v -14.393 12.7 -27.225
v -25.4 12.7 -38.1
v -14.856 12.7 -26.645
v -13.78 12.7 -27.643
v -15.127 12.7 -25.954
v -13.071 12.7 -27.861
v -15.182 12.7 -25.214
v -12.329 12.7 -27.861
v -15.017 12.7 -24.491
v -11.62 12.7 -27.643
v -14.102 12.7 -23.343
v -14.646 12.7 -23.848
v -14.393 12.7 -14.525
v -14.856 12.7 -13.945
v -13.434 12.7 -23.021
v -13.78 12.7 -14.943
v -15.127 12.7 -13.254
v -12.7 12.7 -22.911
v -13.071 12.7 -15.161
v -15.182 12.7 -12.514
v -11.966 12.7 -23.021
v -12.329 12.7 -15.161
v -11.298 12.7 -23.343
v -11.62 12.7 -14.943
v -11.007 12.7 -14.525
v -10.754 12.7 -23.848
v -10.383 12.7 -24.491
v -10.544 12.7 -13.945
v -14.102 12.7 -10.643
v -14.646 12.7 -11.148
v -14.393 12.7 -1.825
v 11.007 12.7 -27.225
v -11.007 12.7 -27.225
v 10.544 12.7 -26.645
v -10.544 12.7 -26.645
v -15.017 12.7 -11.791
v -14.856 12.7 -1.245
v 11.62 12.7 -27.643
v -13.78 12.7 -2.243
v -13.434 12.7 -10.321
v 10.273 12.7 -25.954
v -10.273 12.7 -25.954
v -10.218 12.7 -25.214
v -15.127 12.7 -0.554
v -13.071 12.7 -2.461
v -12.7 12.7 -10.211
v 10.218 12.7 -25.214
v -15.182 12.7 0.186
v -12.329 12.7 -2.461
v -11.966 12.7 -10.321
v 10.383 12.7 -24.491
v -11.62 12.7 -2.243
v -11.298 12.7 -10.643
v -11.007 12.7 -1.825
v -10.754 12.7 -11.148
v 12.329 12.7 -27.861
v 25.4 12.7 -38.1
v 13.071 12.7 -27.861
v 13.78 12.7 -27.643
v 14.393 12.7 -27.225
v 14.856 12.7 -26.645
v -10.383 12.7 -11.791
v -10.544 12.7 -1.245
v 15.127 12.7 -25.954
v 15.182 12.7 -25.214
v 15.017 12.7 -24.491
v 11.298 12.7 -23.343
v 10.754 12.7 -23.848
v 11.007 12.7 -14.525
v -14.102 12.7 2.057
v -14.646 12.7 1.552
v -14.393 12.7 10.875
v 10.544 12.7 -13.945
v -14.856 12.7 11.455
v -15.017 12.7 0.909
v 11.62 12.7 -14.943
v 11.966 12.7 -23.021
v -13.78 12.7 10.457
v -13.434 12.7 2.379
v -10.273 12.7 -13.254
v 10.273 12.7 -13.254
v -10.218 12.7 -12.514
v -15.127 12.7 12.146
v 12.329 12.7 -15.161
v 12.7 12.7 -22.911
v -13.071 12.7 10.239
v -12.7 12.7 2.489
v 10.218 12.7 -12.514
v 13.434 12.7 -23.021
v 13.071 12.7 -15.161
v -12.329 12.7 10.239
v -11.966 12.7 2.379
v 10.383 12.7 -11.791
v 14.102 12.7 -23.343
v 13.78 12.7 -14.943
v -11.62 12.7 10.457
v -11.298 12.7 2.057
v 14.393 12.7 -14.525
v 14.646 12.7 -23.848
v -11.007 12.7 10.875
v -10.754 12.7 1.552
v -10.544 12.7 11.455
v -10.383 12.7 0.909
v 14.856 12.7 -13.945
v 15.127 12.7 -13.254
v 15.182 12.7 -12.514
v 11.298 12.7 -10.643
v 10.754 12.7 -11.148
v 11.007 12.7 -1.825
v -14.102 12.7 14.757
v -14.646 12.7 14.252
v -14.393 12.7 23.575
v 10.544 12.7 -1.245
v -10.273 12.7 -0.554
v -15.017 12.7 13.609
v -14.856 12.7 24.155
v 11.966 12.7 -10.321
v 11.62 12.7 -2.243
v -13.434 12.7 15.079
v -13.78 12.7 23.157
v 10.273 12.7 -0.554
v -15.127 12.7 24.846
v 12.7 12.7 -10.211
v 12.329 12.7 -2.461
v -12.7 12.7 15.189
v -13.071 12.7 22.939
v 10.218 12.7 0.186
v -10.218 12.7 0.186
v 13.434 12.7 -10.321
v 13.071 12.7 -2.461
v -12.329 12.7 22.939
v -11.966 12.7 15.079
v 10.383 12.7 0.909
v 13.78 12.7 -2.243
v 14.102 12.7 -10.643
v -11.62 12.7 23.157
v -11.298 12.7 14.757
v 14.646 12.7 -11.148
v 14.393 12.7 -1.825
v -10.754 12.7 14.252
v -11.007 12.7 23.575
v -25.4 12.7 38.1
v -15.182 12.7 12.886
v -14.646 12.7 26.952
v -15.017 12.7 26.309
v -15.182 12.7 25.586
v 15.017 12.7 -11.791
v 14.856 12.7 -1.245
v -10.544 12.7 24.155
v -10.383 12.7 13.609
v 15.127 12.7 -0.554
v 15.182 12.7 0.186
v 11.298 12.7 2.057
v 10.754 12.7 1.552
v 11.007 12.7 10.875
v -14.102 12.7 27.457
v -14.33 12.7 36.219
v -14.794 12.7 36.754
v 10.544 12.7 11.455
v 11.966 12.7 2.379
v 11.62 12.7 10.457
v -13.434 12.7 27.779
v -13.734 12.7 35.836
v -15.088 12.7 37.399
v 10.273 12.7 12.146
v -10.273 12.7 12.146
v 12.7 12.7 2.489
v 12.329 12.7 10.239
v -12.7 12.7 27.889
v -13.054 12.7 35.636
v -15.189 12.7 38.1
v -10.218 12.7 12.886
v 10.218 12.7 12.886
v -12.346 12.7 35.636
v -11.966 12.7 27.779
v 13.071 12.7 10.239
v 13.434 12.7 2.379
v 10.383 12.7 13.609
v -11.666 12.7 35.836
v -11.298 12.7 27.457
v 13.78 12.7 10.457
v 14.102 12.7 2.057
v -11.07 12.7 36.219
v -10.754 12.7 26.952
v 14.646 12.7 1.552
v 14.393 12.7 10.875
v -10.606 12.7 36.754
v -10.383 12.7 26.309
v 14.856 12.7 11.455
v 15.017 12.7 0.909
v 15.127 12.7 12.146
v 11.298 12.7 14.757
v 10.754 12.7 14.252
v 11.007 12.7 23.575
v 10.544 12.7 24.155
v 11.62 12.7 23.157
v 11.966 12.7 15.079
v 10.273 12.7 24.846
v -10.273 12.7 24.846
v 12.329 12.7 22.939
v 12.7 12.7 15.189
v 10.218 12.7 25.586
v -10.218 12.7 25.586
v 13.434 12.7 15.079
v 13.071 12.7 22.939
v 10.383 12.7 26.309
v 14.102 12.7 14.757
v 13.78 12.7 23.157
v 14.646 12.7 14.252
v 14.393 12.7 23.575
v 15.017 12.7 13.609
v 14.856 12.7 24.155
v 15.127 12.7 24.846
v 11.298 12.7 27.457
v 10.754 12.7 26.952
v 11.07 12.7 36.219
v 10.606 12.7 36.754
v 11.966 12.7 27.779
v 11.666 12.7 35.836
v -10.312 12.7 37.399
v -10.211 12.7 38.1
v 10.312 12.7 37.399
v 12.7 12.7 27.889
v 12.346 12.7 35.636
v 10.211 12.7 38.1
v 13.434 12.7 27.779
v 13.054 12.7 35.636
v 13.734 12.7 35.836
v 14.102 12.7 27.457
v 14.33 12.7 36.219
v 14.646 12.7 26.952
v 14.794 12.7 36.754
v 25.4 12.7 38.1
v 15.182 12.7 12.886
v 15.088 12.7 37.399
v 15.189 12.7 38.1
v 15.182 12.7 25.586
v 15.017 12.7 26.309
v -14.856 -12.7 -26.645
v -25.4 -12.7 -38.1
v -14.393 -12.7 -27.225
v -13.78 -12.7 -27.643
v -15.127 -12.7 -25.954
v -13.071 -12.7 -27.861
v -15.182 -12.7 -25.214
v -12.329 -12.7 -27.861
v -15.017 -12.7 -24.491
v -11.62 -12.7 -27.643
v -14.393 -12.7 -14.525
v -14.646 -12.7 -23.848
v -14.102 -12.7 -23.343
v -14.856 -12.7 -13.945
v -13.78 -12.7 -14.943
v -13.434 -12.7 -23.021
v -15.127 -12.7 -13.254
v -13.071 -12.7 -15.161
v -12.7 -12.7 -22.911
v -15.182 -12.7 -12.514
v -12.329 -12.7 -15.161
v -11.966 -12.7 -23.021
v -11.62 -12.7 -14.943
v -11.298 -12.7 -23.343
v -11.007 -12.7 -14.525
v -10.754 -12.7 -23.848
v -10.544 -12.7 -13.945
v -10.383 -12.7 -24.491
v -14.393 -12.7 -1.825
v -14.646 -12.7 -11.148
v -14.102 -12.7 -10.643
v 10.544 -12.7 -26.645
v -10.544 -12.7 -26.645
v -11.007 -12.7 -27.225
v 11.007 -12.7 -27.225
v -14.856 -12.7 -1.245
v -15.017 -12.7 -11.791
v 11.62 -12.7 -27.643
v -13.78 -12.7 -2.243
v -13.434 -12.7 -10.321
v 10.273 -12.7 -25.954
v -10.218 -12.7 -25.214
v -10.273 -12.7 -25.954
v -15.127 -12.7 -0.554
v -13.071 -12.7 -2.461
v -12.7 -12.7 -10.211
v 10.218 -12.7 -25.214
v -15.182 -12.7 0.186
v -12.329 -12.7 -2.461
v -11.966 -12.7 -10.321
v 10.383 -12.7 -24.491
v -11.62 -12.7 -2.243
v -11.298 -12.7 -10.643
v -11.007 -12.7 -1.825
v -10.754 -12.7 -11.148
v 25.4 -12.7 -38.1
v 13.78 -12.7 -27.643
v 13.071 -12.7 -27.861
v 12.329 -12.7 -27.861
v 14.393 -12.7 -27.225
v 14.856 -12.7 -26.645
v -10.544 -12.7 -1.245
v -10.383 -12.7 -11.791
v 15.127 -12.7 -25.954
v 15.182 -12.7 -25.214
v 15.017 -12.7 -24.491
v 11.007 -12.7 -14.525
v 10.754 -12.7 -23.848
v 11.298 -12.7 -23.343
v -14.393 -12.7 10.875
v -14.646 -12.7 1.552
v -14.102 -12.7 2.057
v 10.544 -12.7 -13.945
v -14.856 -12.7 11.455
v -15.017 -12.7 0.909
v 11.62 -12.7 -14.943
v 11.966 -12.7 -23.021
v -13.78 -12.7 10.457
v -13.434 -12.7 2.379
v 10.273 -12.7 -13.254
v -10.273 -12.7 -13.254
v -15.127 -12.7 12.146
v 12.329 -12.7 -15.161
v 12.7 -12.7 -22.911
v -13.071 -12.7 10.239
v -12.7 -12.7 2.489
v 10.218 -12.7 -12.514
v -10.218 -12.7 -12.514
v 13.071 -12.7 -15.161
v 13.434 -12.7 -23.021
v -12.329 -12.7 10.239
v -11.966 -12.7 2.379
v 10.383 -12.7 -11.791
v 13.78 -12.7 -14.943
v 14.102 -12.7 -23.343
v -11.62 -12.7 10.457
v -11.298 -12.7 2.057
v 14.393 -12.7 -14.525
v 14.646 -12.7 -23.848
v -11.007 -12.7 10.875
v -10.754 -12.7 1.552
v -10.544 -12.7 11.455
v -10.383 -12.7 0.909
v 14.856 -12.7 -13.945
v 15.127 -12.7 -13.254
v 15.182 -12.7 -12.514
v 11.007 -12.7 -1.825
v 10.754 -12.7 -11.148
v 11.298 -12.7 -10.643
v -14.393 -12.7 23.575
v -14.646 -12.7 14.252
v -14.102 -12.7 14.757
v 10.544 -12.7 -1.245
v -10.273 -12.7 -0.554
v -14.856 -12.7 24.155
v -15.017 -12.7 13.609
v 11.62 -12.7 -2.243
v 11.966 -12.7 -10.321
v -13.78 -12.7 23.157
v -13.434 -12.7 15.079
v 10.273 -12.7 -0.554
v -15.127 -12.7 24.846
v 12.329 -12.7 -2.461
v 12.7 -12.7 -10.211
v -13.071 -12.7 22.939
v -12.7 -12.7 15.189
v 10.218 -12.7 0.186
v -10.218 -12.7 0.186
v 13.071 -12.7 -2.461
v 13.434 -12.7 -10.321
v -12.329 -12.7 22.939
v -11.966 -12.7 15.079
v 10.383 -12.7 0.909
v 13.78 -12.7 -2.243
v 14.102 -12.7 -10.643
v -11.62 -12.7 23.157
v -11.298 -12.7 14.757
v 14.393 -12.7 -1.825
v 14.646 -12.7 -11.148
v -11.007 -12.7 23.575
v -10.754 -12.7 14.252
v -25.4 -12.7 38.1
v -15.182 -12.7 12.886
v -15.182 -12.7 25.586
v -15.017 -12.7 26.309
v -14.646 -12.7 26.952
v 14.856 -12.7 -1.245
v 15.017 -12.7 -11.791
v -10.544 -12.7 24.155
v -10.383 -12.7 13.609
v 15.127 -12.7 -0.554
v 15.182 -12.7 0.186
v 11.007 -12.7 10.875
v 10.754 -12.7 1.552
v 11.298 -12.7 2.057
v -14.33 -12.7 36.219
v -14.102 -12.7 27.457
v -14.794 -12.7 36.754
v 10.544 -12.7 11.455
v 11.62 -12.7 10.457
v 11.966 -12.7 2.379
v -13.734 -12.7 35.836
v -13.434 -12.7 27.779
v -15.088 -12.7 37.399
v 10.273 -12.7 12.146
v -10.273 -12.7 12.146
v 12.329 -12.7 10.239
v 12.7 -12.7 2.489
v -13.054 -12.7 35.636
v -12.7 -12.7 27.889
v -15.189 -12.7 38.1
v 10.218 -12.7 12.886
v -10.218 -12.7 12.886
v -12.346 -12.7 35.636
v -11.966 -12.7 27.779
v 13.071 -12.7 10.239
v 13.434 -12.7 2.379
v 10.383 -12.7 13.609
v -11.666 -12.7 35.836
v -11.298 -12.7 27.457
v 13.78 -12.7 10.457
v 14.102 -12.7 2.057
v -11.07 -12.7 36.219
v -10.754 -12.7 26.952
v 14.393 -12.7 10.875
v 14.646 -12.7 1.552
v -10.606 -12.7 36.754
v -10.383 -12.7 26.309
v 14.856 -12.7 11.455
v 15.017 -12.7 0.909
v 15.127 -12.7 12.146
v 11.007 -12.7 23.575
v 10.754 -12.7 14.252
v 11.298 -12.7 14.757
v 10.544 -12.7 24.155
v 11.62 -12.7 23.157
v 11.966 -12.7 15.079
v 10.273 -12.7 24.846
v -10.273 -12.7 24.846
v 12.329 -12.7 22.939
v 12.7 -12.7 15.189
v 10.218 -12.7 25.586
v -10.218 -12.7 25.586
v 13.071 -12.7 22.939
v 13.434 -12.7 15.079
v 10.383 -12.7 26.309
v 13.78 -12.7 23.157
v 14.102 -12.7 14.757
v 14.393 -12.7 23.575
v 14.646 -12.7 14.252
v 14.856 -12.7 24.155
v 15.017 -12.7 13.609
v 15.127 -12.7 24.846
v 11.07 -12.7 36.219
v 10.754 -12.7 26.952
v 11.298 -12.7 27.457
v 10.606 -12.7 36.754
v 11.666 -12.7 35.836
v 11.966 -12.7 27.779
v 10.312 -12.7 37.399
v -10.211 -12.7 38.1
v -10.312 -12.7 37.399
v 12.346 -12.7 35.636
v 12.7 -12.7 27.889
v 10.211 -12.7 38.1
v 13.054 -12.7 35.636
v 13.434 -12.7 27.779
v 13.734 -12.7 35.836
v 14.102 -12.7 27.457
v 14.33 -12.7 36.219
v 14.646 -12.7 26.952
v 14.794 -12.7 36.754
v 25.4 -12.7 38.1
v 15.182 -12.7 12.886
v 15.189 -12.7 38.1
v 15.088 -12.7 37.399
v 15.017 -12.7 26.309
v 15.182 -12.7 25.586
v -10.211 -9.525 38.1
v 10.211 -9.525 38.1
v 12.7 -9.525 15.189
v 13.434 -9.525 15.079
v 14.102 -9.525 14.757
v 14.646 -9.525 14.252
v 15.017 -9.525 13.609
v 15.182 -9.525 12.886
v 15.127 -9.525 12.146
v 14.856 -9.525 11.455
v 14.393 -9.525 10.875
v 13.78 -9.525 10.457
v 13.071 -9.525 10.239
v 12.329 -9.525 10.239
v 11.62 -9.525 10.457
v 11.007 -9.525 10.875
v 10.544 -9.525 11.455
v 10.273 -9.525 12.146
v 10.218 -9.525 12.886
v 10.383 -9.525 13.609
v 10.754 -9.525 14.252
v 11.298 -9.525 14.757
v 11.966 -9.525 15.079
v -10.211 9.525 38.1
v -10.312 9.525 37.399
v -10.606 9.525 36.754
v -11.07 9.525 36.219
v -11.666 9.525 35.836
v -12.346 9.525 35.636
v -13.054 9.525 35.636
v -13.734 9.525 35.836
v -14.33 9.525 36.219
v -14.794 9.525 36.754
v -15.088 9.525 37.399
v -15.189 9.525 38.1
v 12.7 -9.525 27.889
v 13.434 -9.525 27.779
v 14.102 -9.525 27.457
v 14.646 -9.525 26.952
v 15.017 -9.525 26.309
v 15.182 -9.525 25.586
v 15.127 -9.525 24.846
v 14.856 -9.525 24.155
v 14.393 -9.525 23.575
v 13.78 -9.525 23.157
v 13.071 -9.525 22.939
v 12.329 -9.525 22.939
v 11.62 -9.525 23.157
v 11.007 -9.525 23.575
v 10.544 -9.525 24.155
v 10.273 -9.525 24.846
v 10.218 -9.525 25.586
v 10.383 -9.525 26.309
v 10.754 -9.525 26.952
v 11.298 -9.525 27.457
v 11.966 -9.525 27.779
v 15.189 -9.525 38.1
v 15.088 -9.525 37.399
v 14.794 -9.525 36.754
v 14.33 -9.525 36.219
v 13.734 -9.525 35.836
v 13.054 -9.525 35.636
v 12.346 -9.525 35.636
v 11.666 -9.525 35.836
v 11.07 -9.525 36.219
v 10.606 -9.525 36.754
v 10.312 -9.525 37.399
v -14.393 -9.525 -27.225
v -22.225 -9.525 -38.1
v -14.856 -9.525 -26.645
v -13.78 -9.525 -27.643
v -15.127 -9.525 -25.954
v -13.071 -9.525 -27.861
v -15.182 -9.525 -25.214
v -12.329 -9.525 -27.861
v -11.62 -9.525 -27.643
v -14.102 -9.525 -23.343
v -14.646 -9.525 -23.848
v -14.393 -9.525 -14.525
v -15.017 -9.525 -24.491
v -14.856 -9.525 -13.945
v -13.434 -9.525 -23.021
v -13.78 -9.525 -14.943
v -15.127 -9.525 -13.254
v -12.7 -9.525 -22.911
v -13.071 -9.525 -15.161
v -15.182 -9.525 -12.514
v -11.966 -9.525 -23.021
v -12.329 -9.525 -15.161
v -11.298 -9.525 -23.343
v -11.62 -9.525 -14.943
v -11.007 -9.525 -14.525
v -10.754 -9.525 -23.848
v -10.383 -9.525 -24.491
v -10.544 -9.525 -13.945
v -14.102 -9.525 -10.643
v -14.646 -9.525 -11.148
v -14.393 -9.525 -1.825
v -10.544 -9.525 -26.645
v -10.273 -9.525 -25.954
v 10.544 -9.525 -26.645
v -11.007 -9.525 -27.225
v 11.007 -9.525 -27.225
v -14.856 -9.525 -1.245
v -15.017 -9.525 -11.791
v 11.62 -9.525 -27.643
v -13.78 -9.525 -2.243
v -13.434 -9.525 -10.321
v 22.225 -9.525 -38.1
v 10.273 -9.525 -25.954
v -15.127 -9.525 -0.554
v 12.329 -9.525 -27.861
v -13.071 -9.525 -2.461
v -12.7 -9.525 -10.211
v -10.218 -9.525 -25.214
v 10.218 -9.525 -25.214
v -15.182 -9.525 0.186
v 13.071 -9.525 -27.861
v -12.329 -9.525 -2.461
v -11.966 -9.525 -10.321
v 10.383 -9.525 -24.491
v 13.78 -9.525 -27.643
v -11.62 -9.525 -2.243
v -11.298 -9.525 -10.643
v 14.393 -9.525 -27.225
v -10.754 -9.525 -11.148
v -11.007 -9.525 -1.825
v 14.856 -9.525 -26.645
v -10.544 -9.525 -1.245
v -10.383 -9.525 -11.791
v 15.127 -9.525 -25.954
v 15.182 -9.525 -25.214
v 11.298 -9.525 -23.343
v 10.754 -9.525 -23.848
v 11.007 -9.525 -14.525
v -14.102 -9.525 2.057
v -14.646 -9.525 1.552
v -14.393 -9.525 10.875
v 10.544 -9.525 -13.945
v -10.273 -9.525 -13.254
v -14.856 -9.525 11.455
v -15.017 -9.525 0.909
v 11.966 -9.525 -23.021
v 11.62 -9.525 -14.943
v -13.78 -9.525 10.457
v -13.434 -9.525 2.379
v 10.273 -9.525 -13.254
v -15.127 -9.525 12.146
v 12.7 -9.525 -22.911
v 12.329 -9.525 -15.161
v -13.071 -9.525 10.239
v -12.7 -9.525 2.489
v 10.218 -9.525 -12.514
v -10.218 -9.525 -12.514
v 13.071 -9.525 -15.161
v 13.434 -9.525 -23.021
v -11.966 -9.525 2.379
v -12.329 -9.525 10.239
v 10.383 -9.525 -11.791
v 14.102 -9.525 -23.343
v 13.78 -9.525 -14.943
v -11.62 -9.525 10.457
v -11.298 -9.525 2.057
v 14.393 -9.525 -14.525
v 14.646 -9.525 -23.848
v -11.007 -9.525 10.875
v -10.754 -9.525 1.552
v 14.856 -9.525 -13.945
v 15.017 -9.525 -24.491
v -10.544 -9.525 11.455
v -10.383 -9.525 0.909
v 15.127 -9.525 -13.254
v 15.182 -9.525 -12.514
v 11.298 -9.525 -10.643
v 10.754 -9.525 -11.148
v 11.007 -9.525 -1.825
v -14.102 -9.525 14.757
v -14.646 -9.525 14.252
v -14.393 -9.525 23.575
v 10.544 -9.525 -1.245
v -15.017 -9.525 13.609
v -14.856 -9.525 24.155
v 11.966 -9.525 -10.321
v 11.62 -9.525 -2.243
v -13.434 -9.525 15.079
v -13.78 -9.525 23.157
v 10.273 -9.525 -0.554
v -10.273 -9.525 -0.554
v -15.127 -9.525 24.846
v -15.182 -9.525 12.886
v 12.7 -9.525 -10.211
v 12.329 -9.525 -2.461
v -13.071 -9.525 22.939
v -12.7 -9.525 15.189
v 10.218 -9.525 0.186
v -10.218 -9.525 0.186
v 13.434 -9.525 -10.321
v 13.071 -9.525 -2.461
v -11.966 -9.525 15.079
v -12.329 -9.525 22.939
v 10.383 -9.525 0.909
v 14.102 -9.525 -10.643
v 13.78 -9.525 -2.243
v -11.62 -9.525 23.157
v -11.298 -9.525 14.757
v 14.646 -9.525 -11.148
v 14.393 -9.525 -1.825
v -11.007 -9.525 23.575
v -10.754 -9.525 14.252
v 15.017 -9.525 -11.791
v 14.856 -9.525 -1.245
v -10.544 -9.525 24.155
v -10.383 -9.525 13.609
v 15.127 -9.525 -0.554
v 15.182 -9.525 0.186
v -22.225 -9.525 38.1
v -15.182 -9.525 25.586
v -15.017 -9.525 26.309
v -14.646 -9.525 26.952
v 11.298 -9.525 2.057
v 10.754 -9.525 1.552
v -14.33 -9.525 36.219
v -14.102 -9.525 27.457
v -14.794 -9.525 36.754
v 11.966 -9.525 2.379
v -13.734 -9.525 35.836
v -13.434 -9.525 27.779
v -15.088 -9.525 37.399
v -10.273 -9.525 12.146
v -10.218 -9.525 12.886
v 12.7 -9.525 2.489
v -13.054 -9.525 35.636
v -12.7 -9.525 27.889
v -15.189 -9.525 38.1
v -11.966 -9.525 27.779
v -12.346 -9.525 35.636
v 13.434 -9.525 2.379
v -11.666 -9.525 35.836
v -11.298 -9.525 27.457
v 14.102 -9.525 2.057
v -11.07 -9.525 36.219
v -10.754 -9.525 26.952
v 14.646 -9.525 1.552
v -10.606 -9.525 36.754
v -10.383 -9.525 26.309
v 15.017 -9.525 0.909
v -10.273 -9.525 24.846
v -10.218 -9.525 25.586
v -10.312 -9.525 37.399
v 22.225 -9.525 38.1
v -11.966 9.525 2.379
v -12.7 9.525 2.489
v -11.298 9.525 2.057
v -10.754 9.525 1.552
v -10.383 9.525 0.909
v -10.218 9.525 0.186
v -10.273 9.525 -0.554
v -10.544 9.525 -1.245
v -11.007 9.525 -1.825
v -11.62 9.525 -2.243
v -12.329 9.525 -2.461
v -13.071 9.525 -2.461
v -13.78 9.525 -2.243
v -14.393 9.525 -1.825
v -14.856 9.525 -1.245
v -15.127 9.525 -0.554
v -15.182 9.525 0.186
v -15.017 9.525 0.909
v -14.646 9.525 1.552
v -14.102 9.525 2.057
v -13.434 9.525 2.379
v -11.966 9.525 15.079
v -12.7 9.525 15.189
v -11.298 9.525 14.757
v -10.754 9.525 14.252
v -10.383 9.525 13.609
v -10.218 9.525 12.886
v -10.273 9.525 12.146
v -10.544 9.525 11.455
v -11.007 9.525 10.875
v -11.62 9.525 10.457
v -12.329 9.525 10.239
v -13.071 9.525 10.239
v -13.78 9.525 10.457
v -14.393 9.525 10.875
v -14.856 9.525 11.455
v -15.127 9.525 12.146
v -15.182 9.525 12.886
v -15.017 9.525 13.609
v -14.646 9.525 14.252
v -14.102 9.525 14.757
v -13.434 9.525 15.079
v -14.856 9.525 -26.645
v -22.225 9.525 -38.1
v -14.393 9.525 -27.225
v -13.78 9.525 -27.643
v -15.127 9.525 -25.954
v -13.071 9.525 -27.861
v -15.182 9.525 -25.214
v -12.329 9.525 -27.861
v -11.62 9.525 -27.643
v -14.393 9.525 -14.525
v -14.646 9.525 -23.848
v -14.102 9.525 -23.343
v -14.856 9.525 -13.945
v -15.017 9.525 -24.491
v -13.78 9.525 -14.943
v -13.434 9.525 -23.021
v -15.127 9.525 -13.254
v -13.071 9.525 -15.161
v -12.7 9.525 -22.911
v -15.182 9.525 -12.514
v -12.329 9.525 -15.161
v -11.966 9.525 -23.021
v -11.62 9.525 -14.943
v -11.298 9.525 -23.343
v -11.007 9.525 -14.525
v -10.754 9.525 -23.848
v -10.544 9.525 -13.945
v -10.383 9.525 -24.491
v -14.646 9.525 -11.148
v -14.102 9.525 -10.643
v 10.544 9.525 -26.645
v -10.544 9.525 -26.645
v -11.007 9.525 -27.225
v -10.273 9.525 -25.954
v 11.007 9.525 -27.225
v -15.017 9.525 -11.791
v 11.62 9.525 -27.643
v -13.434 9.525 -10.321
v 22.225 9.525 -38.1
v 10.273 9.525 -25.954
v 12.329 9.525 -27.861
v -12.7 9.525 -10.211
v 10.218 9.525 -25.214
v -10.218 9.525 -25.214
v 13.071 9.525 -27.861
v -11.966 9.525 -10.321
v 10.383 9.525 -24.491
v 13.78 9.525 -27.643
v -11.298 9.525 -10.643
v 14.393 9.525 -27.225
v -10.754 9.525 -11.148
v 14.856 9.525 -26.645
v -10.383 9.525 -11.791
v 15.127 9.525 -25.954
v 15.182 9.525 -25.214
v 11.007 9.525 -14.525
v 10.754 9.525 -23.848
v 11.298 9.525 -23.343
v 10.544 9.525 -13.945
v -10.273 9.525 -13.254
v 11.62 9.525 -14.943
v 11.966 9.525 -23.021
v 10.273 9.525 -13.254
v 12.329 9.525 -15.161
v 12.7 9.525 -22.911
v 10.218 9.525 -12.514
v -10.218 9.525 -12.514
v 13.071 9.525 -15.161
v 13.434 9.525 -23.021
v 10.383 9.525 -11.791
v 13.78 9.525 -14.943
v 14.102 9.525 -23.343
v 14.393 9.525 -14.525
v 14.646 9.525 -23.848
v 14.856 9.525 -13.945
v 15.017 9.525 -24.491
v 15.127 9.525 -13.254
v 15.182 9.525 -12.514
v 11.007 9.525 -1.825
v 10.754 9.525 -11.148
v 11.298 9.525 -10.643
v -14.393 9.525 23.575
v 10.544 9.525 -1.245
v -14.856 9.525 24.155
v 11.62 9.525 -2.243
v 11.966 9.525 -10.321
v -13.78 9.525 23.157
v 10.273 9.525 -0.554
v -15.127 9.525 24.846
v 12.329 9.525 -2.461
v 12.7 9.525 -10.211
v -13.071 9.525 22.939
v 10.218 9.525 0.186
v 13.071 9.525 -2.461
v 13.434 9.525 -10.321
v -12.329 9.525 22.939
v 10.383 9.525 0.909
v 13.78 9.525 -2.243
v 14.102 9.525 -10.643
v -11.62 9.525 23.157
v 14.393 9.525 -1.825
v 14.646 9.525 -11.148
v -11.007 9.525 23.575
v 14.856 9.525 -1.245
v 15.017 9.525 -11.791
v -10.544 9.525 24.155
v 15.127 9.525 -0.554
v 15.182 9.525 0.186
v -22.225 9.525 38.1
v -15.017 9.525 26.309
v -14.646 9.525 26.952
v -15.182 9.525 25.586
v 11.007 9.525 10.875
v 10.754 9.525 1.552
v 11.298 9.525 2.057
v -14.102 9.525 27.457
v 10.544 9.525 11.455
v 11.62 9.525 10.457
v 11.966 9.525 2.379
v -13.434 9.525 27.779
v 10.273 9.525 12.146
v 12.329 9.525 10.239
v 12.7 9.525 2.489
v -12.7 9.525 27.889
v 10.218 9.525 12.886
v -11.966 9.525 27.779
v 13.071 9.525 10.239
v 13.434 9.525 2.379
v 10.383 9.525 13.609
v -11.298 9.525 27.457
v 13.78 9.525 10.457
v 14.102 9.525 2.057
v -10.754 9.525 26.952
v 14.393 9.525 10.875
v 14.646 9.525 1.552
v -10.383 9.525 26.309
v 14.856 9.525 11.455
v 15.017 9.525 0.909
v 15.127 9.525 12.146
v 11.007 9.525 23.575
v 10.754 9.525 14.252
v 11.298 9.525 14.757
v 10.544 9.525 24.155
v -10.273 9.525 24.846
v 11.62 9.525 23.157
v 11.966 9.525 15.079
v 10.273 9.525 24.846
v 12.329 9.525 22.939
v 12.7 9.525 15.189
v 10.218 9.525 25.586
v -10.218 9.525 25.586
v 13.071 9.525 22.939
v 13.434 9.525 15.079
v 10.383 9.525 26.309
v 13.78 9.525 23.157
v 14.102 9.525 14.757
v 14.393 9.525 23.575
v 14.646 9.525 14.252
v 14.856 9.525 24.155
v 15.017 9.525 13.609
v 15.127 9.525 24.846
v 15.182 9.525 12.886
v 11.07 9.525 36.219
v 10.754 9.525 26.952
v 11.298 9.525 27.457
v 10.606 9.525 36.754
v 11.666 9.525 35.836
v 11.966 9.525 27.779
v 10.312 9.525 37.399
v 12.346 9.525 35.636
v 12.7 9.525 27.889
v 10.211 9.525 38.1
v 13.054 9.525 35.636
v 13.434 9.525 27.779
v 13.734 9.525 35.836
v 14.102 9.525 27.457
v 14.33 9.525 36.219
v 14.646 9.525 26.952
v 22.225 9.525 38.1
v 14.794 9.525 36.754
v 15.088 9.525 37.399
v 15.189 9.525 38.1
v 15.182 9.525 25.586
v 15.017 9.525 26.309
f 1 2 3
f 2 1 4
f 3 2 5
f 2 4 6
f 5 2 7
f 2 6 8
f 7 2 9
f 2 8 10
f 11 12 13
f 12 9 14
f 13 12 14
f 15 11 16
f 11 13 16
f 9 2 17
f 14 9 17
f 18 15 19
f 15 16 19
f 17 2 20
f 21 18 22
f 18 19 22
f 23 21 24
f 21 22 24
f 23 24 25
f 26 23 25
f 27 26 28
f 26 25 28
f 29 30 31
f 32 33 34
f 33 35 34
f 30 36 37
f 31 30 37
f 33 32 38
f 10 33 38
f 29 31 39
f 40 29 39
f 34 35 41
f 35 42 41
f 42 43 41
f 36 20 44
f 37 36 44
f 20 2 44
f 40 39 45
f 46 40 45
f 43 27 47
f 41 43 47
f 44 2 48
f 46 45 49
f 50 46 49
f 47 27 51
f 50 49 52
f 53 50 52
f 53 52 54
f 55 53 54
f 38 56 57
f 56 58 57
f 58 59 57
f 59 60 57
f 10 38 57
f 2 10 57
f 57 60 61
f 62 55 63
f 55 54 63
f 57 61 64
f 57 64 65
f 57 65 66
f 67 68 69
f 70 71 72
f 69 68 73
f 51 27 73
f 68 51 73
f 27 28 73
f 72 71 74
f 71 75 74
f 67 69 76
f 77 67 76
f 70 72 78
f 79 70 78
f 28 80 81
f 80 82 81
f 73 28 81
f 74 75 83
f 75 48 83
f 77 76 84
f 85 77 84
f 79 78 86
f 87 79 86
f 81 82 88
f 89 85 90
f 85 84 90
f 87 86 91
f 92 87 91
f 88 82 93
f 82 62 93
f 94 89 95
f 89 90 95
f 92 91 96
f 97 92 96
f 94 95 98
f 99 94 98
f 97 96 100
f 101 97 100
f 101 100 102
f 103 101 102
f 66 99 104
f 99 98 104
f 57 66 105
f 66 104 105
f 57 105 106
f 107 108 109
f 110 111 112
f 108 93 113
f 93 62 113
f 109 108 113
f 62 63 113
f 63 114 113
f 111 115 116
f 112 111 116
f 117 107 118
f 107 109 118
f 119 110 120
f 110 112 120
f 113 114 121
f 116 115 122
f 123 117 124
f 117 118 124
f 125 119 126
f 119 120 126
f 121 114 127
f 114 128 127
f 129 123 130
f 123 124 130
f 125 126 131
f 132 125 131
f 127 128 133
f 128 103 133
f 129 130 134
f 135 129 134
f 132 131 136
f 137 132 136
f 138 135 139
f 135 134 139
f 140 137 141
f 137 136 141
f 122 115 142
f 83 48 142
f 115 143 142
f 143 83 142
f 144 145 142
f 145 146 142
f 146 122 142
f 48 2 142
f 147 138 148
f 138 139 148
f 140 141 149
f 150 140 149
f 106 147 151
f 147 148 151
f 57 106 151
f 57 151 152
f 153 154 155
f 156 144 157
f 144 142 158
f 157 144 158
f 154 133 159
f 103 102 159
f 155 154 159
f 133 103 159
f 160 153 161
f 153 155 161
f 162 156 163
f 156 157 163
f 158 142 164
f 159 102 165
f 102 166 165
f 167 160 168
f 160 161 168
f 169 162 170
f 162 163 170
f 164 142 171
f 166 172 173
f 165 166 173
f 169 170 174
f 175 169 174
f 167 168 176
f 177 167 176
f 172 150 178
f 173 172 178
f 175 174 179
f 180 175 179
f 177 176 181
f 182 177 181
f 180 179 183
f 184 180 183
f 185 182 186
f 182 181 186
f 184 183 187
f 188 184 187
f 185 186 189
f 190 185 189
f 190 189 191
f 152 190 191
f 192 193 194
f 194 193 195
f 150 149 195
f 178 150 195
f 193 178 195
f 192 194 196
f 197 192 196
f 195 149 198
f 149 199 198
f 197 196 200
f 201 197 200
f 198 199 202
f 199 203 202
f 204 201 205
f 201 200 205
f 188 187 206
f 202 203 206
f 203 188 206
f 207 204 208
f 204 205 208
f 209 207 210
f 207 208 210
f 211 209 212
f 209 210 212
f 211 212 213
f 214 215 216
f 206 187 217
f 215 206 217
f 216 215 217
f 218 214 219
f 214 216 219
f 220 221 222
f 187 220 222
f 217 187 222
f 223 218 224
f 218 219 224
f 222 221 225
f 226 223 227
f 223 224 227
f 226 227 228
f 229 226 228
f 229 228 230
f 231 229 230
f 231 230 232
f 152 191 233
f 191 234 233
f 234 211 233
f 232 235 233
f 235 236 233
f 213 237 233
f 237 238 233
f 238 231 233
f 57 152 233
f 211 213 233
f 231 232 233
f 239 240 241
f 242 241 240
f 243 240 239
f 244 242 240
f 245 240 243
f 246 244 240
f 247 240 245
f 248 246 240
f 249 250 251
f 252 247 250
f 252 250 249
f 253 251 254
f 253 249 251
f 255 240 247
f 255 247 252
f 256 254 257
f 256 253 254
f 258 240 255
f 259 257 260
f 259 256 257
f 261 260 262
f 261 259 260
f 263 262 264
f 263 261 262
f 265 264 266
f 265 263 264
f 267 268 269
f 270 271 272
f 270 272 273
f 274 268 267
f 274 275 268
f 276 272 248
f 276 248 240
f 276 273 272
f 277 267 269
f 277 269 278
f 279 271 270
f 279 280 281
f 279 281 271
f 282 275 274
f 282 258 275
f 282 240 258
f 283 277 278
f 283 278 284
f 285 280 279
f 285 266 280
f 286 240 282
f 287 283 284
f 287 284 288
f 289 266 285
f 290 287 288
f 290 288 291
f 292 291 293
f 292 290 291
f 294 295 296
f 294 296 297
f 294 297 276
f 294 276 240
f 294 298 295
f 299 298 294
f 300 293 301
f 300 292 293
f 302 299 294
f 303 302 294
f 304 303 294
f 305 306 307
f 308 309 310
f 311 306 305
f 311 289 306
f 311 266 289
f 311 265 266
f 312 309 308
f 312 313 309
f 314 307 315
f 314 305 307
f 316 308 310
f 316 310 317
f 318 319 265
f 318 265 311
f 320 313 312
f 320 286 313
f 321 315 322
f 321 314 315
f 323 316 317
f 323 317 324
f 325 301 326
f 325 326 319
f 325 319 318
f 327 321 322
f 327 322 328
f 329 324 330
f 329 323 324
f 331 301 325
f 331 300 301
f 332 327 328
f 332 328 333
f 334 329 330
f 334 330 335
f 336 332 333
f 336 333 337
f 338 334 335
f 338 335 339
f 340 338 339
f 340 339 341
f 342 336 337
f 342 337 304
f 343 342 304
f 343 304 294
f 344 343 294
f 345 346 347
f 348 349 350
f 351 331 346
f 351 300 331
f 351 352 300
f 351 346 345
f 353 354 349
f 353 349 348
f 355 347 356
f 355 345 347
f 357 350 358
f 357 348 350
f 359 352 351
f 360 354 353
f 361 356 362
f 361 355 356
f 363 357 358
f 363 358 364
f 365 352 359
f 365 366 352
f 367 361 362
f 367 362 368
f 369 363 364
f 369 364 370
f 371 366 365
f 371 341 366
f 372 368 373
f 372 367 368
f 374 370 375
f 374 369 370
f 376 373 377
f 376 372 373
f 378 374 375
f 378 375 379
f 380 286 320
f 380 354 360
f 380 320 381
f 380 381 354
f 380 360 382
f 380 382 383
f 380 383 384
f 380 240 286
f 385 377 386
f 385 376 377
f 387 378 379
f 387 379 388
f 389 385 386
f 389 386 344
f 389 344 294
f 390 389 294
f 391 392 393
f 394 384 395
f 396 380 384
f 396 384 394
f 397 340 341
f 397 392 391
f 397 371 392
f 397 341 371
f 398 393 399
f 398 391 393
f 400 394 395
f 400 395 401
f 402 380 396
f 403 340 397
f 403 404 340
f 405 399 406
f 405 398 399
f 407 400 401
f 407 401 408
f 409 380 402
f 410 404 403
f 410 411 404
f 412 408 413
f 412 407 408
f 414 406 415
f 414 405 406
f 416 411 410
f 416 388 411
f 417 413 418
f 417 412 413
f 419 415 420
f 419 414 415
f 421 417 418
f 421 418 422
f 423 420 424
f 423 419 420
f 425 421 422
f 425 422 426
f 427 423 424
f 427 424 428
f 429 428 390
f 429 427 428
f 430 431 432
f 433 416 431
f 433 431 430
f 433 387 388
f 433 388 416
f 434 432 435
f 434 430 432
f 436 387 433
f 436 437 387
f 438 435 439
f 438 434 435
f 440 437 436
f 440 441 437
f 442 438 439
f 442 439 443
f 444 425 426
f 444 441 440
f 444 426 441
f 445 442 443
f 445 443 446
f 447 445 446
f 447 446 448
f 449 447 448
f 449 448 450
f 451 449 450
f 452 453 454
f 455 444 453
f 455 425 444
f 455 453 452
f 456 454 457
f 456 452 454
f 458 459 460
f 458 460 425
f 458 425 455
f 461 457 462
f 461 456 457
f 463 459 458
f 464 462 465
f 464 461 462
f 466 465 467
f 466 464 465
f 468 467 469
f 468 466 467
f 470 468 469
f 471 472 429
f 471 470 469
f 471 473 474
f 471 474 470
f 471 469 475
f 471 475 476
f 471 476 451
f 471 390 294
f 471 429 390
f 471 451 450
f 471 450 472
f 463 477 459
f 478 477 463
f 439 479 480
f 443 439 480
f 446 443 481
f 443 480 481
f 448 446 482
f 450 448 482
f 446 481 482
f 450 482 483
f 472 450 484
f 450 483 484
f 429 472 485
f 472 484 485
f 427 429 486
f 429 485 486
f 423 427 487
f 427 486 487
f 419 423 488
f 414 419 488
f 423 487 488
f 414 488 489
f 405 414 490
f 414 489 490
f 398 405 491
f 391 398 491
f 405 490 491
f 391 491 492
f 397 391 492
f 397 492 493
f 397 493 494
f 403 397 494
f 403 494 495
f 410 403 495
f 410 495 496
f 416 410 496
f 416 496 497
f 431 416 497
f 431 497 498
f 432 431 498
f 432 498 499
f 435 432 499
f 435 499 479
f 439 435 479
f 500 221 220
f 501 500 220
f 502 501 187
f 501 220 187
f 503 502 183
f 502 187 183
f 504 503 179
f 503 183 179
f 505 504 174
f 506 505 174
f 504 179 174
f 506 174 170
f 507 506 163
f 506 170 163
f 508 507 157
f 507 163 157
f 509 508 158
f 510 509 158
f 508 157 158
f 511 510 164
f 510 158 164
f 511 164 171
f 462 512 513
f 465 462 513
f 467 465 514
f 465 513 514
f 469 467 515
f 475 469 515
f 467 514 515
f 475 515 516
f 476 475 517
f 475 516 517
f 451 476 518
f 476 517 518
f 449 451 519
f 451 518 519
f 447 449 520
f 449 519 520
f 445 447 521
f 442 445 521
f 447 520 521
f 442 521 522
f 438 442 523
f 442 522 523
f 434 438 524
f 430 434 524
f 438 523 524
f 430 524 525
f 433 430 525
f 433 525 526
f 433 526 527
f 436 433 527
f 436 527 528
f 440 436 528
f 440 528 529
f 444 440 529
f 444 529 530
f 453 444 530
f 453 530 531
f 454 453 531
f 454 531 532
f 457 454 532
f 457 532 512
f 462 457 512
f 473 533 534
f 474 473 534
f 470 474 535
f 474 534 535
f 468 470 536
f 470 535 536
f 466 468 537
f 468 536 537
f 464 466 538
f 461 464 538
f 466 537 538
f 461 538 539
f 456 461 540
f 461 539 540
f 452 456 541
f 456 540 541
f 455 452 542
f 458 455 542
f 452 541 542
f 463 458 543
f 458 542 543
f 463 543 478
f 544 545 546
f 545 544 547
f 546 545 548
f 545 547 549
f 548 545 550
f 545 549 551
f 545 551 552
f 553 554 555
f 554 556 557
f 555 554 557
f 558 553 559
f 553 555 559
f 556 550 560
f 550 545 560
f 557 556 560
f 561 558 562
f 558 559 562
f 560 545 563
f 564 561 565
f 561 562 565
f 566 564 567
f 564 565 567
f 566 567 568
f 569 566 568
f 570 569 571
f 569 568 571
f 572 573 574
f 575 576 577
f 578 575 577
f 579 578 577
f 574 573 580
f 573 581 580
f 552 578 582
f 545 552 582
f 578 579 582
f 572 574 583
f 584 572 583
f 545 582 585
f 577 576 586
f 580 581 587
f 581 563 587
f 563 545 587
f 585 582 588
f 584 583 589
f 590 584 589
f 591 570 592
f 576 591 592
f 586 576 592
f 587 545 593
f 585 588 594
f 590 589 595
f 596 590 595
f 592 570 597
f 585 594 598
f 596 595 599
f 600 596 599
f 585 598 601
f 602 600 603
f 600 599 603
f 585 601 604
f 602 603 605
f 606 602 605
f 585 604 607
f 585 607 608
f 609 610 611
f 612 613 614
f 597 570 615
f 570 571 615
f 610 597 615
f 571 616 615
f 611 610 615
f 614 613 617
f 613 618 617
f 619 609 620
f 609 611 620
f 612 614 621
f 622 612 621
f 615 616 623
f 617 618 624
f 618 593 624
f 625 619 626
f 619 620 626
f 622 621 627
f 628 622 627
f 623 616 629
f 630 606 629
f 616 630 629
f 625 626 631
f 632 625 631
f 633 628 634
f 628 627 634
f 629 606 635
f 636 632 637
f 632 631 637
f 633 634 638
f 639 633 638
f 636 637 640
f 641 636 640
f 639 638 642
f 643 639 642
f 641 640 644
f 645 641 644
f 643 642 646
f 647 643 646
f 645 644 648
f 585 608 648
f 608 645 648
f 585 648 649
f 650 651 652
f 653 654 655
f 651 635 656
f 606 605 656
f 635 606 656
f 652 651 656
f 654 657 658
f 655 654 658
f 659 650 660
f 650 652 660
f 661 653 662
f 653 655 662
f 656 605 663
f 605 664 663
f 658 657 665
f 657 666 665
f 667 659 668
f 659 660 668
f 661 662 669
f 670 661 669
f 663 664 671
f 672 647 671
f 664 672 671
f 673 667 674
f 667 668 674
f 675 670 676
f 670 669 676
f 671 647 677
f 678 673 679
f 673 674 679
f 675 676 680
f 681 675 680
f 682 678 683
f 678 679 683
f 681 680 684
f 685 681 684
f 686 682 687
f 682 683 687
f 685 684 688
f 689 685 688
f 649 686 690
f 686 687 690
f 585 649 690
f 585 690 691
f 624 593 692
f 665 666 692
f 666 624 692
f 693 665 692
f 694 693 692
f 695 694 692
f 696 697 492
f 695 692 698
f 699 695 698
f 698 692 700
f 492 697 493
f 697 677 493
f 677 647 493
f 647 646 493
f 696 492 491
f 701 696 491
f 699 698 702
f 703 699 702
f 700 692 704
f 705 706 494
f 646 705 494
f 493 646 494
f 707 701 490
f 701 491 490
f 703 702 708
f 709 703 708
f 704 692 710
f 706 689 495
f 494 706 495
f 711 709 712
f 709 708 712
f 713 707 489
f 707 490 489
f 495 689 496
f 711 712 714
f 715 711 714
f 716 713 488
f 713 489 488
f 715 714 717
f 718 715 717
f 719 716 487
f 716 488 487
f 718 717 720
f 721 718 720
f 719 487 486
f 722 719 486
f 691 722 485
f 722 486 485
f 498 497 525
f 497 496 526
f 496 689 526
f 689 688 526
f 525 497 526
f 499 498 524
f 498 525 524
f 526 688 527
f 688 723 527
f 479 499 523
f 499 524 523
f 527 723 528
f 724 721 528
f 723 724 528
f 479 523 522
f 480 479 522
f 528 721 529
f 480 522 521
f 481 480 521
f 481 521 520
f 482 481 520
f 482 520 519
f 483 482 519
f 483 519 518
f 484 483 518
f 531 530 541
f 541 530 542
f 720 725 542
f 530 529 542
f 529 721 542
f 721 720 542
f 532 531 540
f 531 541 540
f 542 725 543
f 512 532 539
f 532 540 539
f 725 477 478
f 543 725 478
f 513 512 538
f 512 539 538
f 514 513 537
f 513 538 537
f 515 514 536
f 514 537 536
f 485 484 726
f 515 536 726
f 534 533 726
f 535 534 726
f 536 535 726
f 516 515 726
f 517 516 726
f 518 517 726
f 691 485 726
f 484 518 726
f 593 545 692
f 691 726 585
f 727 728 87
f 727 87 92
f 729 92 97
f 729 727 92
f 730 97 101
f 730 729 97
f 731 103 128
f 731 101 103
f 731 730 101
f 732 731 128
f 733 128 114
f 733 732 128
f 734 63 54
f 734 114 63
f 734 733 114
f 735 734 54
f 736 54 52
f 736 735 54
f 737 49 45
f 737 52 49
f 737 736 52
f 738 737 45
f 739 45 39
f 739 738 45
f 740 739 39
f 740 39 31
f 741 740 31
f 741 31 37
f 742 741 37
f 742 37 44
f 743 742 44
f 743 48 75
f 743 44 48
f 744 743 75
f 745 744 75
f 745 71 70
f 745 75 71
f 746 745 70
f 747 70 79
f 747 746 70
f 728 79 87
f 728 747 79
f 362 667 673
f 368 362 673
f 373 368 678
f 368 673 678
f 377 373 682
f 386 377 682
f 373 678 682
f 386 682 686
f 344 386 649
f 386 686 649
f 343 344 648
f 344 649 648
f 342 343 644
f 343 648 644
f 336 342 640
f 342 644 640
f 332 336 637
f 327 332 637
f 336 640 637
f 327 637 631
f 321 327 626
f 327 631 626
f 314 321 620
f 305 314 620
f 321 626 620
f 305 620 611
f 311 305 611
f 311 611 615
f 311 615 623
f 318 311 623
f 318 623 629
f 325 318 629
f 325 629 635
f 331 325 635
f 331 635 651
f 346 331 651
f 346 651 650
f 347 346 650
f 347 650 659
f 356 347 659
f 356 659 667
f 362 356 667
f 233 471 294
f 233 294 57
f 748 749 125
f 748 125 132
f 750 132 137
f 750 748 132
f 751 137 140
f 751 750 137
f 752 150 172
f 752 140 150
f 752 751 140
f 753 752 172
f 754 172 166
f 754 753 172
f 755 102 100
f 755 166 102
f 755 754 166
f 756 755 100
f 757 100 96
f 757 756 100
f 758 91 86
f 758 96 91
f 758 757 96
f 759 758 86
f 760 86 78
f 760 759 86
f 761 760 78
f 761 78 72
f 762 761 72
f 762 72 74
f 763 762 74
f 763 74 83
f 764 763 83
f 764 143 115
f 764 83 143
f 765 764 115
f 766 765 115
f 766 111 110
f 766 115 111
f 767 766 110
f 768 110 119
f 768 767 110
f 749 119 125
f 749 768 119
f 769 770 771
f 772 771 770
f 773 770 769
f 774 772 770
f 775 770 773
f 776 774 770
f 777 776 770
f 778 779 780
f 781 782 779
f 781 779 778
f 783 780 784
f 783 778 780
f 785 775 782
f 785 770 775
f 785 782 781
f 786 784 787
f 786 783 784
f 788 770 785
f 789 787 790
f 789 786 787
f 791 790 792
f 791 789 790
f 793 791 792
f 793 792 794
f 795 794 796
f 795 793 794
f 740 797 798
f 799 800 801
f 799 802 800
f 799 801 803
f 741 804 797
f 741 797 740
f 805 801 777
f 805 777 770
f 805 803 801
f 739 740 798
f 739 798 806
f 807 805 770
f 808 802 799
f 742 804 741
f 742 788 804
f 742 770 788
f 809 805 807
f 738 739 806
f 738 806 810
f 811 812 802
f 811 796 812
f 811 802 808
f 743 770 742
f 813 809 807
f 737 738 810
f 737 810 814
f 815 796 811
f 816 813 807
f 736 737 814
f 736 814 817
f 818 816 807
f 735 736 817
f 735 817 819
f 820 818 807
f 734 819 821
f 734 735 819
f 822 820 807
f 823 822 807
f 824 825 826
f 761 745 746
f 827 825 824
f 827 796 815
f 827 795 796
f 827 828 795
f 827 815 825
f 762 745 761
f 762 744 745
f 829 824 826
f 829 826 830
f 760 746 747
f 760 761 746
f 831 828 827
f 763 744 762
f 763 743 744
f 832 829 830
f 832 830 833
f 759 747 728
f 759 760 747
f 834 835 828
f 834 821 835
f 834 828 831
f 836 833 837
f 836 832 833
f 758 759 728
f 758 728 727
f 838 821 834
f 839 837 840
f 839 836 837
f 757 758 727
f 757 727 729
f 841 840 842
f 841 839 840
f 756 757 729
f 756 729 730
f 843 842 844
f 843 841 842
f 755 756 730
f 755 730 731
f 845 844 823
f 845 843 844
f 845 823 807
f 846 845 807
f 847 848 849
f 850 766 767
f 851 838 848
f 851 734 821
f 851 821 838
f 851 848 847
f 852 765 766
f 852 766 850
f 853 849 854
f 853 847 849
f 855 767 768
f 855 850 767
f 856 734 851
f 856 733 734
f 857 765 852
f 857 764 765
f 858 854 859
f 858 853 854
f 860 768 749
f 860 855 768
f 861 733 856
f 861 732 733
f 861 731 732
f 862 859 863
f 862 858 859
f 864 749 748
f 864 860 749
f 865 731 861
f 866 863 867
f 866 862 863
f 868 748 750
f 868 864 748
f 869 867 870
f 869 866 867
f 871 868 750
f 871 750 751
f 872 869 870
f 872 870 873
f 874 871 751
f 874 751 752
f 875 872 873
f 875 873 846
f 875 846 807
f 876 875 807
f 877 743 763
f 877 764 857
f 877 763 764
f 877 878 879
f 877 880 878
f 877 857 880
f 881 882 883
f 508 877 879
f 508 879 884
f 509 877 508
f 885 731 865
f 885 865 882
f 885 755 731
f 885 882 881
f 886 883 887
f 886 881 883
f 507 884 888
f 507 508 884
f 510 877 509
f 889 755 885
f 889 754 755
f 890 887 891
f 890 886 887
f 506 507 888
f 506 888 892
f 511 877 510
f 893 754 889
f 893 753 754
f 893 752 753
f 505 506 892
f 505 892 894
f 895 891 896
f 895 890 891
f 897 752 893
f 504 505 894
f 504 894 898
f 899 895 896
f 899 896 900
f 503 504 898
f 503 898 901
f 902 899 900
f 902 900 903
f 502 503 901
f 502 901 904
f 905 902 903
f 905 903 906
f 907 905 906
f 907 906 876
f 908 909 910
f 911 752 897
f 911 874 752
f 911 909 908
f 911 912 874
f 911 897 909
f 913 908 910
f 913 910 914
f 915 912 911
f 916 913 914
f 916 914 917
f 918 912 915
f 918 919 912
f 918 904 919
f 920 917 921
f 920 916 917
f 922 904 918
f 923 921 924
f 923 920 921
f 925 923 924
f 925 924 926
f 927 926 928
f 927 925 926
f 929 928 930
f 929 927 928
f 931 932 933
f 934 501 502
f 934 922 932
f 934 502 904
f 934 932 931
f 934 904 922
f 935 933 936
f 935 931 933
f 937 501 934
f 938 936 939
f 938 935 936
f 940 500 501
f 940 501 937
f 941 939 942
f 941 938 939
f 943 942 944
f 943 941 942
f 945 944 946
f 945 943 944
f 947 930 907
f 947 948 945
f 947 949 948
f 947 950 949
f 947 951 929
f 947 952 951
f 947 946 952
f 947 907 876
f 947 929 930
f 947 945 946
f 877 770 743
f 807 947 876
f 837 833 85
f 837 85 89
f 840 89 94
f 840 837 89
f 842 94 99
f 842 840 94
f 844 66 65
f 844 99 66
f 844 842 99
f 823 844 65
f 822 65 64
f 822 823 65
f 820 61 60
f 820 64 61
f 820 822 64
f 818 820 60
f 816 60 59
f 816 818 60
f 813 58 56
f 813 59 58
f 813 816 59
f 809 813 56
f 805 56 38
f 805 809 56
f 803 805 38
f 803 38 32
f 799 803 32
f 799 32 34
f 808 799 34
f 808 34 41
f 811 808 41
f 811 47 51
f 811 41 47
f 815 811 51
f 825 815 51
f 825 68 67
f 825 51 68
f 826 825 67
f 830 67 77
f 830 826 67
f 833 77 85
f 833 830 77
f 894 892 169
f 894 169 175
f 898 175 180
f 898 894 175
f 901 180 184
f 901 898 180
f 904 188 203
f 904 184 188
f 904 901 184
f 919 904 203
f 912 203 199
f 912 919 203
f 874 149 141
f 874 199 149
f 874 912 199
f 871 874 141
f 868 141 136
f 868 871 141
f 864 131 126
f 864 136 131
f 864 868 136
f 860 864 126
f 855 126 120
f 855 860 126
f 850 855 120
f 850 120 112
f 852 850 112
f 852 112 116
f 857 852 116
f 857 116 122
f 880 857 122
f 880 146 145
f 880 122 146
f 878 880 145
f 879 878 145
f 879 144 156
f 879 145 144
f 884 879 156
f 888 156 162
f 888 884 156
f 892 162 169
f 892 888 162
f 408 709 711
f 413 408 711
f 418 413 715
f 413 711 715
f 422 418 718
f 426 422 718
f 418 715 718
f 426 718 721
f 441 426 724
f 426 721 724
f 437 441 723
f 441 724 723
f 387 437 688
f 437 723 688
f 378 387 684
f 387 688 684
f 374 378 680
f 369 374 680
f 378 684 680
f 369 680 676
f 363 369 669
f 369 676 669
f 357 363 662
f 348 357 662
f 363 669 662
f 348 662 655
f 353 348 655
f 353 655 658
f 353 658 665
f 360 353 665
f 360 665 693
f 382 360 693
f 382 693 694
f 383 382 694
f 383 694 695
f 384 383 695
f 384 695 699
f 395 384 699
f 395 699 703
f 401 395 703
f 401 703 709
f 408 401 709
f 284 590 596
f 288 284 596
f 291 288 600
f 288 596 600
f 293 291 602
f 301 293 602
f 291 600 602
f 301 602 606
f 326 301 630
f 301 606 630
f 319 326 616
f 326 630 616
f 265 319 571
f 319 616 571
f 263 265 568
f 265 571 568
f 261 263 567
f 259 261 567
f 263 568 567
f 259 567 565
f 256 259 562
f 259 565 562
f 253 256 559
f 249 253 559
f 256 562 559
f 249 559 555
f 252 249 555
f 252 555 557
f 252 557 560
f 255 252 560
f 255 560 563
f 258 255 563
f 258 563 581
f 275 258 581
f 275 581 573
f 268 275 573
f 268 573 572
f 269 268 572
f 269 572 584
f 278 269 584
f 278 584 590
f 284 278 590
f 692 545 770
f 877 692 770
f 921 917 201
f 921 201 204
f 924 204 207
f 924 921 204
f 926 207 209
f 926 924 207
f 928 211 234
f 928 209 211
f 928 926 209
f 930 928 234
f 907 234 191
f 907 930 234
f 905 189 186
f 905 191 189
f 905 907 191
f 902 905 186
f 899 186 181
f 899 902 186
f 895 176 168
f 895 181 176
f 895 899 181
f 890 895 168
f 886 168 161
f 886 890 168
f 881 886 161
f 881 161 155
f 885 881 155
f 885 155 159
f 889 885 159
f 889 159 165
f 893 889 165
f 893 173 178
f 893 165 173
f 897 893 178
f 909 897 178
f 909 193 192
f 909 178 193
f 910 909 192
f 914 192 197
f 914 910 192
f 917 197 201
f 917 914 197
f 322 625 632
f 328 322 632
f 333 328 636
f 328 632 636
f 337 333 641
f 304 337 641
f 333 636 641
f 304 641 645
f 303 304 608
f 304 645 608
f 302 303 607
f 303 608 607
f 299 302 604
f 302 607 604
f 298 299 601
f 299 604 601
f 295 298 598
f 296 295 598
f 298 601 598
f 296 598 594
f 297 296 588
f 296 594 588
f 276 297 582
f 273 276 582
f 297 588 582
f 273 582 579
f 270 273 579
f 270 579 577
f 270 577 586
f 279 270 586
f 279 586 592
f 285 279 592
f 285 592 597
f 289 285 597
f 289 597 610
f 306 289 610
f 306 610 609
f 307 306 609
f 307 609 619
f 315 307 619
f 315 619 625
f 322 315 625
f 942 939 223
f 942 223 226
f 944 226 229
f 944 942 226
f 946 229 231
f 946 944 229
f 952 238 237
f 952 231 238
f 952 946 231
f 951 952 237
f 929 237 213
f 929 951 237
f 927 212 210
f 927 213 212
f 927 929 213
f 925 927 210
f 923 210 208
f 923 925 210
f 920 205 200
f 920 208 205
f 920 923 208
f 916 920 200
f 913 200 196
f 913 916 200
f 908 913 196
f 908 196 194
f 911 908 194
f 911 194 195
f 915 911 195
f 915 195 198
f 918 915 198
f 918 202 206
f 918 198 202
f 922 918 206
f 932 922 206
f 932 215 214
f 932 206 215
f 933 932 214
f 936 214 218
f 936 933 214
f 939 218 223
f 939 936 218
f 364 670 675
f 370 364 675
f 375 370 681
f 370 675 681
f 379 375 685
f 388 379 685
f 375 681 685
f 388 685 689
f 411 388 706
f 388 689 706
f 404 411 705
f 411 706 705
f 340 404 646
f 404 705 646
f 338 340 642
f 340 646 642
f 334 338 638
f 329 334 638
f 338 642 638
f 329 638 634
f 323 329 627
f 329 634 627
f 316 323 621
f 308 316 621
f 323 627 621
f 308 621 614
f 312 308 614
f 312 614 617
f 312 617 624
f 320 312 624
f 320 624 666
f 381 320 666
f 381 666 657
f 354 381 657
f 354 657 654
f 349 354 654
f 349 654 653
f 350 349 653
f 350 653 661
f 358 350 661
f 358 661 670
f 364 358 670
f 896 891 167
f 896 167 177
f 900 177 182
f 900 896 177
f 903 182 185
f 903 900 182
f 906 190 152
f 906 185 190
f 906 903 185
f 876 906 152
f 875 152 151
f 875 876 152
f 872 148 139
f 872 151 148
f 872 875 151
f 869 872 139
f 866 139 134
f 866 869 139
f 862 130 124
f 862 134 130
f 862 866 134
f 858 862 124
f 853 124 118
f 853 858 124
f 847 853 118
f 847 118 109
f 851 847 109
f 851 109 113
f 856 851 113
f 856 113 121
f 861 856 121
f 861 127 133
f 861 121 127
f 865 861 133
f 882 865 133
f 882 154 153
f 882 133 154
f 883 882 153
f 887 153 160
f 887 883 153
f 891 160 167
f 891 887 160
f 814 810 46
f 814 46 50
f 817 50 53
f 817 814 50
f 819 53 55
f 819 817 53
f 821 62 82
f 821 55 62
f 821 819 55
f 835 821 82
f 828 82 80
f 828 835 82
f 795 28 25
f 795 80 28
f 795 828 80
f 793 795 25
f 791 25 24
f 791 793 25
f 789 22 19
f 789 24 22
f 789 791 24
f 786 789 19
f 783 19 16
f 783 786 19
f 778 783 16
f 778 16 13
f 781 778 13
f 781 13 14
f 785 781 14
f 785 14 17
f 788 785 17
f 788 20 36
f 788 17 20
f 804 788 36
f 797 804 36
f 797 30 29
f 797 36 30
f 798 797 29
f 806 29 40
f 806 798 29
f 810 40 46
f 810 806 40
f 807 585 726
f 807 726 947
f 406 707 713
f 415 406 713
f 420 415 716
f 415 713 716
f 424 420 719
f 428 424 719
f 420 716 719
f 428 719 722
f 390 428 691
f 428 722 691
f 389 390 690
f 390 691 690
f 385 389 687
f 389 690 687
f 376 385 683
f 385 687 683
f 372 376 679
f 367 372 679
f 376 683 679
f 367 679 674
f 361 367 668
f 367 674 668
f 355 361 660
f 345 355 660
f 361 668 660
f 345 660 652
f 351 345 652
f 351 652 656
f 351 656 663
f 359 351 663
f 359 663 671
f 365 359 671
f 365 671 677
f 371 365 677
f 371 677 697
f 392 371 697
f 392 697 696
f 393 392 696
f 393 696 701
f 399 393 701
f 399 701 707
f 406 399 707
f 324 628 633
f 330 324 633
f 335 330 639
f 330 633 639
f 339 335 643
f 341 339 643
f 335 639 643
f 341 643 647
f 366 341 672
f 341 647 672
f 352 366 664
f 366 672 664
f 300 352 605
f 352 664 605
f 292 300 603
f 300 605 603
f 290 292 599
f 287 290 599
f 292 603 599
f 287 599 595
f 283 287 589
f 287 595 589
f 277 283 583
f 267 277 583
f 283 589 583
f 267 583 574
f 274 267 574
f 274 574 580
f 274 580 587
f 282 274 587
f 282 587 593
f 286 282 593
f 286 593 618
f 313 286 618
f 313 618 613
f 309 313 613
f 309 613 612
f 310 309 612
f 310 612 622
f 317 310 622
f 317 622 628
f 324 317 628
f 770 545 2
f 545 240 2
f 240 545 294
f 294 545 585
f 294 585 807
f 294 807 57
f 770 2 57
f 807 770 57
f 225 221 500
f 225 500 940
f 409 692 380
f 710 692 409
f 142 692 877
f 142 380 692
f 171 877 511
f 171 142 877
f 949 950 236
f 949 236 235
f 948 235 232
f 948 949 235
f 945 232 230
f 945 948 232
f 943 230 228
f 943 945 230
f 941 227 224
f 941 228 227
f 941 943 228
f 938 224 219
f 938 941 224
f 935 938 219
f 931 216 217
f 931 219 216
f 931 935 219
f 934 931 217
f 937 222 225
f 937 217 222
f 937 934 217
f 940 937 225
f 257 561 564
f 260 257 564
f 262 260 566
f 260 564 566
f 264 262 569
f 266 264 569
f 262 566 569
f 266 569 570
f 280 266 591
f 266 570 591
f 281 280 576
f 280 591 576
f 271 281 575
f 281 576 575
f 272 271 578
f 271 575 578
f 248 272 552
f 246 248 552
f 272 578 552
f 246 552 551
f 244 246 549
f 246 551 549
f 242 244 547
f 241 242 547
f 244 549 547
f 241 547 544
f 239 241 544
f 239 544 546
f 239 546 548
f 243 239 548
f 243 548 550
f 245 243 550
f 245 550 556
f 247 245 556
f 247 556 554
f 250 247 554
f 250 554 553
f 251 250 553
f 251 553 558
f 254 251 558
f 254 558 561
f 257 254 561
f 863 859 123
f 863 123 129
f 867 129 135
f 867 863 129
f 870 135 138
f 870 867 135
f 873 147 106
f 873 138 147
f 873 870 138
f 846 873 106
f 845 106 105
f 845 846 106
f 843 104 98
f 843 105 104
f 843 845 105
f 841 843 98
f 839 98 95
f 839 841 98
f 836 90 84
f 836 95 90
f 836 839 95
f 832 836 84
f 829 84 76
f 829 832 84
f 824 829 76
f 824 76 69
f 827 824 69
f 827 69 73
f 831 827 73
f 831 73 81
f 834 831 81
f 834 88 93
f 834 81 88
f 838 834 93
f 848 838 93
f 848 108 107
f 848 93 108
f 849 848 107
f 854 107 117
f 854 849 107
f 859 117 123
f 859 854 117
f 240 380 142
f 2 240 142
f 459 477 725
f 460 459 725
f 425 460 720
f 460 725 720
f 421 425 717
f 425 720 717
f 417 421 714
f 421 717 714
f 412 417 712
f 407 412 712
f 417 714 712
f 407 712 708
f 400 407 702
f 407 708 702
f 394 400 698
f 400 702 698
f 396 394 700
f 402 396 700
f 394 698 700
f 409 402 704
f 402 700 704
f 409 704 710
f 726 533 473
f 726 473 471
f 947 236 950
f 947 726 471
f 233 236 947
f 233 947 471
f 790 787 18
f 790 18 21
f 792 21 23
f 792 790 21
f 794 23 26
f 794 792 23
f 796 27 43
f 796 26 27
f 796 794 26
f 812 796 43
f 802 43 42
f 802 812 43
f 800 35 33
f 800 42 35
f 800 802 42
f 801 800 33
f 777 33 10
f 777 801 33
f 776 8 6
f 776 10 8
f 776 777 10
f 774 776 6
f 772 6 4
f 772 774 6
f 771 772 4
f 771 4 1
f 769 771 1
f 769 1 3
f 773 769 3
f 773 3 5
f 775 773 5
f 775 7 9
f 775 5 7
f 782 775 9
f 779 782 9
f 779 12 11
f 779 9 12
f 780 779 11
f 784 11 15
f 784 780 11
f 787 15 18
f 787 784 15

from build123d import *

# Parameters (mm, degrees)
SKETCH1_W           = 50.8
SKETCH1_H           = 25.4
BOSS_EXTRUDE1_DEPTH = 38.1
SHELL1_T            = -3.175
SKETCH2_R           = 2.4892
CUT_EXTRUDE1_DEPTH  = 63.5


with BuildPart() as part:
    # Sketch1 → Boss-Extrude1 (new, symmetric)
    with BuildSketch(Plane.XY):
        Rectangle(SKETCH1_W, SKETCH1_H)
    extrude(amount=BOSS_EXTRUDE1_DEPTH, both=True)

    # Shell1
    shell1_openings = [part.faces().sort_by_distance(p)[0] for p in [
        (0, 0, 38.1),
        (0, 0, -38.1),
    ]]
    offset(amount=SHELL1_T, openings=shell1_openings, kind=Kind.INTERSECTION)

    # Sketch2 → Cut-Extrude1 (cut, symmetric)
    with BuildSketch(Plane(origin=(0, 0, 0), x_dir=(1, 0, 0), z_dir=(0, 1, 0))):
        with Locations(Location((-12.7, 25.4, 0), (0, 0, 270))):
            Circle(SKETCH2_R)
        with Locations(Location((12.7, 25.4, 0), (0, 0, 270))):
            Circle(SKETCH2_R)
        with Locations(Location((12.7, 12.7, 0), (0, 0, 270))):
            Circle(SKETCH2_R)
        with Locations(Location((12.7, 0, 0), (0, 0, 270))):
            Circle(SKETCH2_R)
        with Locations(Location((12.7, -12.7, 0), (0, 0, 270))):
            Circle(SKETCH2_R)
        with Locations(Location((12.7, -25.4, 0), (0, 0, 270))):
            Circle(SKETCH2_R)
        with Locations((12.7, -38.1)):
            Circle(SKETCH2_R)
        with Locations(Location((-12.7, 12.7, 0), (0, 0, 270))):
            Circle(SKETCH2_R)
        with Locations(Location((-12.7, 0, 0), (0, 0, 270))):
            Circle(SKETCH2_R)
        with Locations(Location((-12.7, -12.7, 0), (0, 0, 270))):
            Circle(SKETCH2_R)
        with Locations(Location((-12.7, -25.4, 0), (0, 0, 270))):
            Circle(SKETCH2_R)
        with Locations((-12.7, -38.1)):
            Circle(SKETCH2_R)
    extrude(amount=CUT_EXTRUDE1_DEPTH, both=True, mode=Mode.SUBTRACT)


solid = part.part
